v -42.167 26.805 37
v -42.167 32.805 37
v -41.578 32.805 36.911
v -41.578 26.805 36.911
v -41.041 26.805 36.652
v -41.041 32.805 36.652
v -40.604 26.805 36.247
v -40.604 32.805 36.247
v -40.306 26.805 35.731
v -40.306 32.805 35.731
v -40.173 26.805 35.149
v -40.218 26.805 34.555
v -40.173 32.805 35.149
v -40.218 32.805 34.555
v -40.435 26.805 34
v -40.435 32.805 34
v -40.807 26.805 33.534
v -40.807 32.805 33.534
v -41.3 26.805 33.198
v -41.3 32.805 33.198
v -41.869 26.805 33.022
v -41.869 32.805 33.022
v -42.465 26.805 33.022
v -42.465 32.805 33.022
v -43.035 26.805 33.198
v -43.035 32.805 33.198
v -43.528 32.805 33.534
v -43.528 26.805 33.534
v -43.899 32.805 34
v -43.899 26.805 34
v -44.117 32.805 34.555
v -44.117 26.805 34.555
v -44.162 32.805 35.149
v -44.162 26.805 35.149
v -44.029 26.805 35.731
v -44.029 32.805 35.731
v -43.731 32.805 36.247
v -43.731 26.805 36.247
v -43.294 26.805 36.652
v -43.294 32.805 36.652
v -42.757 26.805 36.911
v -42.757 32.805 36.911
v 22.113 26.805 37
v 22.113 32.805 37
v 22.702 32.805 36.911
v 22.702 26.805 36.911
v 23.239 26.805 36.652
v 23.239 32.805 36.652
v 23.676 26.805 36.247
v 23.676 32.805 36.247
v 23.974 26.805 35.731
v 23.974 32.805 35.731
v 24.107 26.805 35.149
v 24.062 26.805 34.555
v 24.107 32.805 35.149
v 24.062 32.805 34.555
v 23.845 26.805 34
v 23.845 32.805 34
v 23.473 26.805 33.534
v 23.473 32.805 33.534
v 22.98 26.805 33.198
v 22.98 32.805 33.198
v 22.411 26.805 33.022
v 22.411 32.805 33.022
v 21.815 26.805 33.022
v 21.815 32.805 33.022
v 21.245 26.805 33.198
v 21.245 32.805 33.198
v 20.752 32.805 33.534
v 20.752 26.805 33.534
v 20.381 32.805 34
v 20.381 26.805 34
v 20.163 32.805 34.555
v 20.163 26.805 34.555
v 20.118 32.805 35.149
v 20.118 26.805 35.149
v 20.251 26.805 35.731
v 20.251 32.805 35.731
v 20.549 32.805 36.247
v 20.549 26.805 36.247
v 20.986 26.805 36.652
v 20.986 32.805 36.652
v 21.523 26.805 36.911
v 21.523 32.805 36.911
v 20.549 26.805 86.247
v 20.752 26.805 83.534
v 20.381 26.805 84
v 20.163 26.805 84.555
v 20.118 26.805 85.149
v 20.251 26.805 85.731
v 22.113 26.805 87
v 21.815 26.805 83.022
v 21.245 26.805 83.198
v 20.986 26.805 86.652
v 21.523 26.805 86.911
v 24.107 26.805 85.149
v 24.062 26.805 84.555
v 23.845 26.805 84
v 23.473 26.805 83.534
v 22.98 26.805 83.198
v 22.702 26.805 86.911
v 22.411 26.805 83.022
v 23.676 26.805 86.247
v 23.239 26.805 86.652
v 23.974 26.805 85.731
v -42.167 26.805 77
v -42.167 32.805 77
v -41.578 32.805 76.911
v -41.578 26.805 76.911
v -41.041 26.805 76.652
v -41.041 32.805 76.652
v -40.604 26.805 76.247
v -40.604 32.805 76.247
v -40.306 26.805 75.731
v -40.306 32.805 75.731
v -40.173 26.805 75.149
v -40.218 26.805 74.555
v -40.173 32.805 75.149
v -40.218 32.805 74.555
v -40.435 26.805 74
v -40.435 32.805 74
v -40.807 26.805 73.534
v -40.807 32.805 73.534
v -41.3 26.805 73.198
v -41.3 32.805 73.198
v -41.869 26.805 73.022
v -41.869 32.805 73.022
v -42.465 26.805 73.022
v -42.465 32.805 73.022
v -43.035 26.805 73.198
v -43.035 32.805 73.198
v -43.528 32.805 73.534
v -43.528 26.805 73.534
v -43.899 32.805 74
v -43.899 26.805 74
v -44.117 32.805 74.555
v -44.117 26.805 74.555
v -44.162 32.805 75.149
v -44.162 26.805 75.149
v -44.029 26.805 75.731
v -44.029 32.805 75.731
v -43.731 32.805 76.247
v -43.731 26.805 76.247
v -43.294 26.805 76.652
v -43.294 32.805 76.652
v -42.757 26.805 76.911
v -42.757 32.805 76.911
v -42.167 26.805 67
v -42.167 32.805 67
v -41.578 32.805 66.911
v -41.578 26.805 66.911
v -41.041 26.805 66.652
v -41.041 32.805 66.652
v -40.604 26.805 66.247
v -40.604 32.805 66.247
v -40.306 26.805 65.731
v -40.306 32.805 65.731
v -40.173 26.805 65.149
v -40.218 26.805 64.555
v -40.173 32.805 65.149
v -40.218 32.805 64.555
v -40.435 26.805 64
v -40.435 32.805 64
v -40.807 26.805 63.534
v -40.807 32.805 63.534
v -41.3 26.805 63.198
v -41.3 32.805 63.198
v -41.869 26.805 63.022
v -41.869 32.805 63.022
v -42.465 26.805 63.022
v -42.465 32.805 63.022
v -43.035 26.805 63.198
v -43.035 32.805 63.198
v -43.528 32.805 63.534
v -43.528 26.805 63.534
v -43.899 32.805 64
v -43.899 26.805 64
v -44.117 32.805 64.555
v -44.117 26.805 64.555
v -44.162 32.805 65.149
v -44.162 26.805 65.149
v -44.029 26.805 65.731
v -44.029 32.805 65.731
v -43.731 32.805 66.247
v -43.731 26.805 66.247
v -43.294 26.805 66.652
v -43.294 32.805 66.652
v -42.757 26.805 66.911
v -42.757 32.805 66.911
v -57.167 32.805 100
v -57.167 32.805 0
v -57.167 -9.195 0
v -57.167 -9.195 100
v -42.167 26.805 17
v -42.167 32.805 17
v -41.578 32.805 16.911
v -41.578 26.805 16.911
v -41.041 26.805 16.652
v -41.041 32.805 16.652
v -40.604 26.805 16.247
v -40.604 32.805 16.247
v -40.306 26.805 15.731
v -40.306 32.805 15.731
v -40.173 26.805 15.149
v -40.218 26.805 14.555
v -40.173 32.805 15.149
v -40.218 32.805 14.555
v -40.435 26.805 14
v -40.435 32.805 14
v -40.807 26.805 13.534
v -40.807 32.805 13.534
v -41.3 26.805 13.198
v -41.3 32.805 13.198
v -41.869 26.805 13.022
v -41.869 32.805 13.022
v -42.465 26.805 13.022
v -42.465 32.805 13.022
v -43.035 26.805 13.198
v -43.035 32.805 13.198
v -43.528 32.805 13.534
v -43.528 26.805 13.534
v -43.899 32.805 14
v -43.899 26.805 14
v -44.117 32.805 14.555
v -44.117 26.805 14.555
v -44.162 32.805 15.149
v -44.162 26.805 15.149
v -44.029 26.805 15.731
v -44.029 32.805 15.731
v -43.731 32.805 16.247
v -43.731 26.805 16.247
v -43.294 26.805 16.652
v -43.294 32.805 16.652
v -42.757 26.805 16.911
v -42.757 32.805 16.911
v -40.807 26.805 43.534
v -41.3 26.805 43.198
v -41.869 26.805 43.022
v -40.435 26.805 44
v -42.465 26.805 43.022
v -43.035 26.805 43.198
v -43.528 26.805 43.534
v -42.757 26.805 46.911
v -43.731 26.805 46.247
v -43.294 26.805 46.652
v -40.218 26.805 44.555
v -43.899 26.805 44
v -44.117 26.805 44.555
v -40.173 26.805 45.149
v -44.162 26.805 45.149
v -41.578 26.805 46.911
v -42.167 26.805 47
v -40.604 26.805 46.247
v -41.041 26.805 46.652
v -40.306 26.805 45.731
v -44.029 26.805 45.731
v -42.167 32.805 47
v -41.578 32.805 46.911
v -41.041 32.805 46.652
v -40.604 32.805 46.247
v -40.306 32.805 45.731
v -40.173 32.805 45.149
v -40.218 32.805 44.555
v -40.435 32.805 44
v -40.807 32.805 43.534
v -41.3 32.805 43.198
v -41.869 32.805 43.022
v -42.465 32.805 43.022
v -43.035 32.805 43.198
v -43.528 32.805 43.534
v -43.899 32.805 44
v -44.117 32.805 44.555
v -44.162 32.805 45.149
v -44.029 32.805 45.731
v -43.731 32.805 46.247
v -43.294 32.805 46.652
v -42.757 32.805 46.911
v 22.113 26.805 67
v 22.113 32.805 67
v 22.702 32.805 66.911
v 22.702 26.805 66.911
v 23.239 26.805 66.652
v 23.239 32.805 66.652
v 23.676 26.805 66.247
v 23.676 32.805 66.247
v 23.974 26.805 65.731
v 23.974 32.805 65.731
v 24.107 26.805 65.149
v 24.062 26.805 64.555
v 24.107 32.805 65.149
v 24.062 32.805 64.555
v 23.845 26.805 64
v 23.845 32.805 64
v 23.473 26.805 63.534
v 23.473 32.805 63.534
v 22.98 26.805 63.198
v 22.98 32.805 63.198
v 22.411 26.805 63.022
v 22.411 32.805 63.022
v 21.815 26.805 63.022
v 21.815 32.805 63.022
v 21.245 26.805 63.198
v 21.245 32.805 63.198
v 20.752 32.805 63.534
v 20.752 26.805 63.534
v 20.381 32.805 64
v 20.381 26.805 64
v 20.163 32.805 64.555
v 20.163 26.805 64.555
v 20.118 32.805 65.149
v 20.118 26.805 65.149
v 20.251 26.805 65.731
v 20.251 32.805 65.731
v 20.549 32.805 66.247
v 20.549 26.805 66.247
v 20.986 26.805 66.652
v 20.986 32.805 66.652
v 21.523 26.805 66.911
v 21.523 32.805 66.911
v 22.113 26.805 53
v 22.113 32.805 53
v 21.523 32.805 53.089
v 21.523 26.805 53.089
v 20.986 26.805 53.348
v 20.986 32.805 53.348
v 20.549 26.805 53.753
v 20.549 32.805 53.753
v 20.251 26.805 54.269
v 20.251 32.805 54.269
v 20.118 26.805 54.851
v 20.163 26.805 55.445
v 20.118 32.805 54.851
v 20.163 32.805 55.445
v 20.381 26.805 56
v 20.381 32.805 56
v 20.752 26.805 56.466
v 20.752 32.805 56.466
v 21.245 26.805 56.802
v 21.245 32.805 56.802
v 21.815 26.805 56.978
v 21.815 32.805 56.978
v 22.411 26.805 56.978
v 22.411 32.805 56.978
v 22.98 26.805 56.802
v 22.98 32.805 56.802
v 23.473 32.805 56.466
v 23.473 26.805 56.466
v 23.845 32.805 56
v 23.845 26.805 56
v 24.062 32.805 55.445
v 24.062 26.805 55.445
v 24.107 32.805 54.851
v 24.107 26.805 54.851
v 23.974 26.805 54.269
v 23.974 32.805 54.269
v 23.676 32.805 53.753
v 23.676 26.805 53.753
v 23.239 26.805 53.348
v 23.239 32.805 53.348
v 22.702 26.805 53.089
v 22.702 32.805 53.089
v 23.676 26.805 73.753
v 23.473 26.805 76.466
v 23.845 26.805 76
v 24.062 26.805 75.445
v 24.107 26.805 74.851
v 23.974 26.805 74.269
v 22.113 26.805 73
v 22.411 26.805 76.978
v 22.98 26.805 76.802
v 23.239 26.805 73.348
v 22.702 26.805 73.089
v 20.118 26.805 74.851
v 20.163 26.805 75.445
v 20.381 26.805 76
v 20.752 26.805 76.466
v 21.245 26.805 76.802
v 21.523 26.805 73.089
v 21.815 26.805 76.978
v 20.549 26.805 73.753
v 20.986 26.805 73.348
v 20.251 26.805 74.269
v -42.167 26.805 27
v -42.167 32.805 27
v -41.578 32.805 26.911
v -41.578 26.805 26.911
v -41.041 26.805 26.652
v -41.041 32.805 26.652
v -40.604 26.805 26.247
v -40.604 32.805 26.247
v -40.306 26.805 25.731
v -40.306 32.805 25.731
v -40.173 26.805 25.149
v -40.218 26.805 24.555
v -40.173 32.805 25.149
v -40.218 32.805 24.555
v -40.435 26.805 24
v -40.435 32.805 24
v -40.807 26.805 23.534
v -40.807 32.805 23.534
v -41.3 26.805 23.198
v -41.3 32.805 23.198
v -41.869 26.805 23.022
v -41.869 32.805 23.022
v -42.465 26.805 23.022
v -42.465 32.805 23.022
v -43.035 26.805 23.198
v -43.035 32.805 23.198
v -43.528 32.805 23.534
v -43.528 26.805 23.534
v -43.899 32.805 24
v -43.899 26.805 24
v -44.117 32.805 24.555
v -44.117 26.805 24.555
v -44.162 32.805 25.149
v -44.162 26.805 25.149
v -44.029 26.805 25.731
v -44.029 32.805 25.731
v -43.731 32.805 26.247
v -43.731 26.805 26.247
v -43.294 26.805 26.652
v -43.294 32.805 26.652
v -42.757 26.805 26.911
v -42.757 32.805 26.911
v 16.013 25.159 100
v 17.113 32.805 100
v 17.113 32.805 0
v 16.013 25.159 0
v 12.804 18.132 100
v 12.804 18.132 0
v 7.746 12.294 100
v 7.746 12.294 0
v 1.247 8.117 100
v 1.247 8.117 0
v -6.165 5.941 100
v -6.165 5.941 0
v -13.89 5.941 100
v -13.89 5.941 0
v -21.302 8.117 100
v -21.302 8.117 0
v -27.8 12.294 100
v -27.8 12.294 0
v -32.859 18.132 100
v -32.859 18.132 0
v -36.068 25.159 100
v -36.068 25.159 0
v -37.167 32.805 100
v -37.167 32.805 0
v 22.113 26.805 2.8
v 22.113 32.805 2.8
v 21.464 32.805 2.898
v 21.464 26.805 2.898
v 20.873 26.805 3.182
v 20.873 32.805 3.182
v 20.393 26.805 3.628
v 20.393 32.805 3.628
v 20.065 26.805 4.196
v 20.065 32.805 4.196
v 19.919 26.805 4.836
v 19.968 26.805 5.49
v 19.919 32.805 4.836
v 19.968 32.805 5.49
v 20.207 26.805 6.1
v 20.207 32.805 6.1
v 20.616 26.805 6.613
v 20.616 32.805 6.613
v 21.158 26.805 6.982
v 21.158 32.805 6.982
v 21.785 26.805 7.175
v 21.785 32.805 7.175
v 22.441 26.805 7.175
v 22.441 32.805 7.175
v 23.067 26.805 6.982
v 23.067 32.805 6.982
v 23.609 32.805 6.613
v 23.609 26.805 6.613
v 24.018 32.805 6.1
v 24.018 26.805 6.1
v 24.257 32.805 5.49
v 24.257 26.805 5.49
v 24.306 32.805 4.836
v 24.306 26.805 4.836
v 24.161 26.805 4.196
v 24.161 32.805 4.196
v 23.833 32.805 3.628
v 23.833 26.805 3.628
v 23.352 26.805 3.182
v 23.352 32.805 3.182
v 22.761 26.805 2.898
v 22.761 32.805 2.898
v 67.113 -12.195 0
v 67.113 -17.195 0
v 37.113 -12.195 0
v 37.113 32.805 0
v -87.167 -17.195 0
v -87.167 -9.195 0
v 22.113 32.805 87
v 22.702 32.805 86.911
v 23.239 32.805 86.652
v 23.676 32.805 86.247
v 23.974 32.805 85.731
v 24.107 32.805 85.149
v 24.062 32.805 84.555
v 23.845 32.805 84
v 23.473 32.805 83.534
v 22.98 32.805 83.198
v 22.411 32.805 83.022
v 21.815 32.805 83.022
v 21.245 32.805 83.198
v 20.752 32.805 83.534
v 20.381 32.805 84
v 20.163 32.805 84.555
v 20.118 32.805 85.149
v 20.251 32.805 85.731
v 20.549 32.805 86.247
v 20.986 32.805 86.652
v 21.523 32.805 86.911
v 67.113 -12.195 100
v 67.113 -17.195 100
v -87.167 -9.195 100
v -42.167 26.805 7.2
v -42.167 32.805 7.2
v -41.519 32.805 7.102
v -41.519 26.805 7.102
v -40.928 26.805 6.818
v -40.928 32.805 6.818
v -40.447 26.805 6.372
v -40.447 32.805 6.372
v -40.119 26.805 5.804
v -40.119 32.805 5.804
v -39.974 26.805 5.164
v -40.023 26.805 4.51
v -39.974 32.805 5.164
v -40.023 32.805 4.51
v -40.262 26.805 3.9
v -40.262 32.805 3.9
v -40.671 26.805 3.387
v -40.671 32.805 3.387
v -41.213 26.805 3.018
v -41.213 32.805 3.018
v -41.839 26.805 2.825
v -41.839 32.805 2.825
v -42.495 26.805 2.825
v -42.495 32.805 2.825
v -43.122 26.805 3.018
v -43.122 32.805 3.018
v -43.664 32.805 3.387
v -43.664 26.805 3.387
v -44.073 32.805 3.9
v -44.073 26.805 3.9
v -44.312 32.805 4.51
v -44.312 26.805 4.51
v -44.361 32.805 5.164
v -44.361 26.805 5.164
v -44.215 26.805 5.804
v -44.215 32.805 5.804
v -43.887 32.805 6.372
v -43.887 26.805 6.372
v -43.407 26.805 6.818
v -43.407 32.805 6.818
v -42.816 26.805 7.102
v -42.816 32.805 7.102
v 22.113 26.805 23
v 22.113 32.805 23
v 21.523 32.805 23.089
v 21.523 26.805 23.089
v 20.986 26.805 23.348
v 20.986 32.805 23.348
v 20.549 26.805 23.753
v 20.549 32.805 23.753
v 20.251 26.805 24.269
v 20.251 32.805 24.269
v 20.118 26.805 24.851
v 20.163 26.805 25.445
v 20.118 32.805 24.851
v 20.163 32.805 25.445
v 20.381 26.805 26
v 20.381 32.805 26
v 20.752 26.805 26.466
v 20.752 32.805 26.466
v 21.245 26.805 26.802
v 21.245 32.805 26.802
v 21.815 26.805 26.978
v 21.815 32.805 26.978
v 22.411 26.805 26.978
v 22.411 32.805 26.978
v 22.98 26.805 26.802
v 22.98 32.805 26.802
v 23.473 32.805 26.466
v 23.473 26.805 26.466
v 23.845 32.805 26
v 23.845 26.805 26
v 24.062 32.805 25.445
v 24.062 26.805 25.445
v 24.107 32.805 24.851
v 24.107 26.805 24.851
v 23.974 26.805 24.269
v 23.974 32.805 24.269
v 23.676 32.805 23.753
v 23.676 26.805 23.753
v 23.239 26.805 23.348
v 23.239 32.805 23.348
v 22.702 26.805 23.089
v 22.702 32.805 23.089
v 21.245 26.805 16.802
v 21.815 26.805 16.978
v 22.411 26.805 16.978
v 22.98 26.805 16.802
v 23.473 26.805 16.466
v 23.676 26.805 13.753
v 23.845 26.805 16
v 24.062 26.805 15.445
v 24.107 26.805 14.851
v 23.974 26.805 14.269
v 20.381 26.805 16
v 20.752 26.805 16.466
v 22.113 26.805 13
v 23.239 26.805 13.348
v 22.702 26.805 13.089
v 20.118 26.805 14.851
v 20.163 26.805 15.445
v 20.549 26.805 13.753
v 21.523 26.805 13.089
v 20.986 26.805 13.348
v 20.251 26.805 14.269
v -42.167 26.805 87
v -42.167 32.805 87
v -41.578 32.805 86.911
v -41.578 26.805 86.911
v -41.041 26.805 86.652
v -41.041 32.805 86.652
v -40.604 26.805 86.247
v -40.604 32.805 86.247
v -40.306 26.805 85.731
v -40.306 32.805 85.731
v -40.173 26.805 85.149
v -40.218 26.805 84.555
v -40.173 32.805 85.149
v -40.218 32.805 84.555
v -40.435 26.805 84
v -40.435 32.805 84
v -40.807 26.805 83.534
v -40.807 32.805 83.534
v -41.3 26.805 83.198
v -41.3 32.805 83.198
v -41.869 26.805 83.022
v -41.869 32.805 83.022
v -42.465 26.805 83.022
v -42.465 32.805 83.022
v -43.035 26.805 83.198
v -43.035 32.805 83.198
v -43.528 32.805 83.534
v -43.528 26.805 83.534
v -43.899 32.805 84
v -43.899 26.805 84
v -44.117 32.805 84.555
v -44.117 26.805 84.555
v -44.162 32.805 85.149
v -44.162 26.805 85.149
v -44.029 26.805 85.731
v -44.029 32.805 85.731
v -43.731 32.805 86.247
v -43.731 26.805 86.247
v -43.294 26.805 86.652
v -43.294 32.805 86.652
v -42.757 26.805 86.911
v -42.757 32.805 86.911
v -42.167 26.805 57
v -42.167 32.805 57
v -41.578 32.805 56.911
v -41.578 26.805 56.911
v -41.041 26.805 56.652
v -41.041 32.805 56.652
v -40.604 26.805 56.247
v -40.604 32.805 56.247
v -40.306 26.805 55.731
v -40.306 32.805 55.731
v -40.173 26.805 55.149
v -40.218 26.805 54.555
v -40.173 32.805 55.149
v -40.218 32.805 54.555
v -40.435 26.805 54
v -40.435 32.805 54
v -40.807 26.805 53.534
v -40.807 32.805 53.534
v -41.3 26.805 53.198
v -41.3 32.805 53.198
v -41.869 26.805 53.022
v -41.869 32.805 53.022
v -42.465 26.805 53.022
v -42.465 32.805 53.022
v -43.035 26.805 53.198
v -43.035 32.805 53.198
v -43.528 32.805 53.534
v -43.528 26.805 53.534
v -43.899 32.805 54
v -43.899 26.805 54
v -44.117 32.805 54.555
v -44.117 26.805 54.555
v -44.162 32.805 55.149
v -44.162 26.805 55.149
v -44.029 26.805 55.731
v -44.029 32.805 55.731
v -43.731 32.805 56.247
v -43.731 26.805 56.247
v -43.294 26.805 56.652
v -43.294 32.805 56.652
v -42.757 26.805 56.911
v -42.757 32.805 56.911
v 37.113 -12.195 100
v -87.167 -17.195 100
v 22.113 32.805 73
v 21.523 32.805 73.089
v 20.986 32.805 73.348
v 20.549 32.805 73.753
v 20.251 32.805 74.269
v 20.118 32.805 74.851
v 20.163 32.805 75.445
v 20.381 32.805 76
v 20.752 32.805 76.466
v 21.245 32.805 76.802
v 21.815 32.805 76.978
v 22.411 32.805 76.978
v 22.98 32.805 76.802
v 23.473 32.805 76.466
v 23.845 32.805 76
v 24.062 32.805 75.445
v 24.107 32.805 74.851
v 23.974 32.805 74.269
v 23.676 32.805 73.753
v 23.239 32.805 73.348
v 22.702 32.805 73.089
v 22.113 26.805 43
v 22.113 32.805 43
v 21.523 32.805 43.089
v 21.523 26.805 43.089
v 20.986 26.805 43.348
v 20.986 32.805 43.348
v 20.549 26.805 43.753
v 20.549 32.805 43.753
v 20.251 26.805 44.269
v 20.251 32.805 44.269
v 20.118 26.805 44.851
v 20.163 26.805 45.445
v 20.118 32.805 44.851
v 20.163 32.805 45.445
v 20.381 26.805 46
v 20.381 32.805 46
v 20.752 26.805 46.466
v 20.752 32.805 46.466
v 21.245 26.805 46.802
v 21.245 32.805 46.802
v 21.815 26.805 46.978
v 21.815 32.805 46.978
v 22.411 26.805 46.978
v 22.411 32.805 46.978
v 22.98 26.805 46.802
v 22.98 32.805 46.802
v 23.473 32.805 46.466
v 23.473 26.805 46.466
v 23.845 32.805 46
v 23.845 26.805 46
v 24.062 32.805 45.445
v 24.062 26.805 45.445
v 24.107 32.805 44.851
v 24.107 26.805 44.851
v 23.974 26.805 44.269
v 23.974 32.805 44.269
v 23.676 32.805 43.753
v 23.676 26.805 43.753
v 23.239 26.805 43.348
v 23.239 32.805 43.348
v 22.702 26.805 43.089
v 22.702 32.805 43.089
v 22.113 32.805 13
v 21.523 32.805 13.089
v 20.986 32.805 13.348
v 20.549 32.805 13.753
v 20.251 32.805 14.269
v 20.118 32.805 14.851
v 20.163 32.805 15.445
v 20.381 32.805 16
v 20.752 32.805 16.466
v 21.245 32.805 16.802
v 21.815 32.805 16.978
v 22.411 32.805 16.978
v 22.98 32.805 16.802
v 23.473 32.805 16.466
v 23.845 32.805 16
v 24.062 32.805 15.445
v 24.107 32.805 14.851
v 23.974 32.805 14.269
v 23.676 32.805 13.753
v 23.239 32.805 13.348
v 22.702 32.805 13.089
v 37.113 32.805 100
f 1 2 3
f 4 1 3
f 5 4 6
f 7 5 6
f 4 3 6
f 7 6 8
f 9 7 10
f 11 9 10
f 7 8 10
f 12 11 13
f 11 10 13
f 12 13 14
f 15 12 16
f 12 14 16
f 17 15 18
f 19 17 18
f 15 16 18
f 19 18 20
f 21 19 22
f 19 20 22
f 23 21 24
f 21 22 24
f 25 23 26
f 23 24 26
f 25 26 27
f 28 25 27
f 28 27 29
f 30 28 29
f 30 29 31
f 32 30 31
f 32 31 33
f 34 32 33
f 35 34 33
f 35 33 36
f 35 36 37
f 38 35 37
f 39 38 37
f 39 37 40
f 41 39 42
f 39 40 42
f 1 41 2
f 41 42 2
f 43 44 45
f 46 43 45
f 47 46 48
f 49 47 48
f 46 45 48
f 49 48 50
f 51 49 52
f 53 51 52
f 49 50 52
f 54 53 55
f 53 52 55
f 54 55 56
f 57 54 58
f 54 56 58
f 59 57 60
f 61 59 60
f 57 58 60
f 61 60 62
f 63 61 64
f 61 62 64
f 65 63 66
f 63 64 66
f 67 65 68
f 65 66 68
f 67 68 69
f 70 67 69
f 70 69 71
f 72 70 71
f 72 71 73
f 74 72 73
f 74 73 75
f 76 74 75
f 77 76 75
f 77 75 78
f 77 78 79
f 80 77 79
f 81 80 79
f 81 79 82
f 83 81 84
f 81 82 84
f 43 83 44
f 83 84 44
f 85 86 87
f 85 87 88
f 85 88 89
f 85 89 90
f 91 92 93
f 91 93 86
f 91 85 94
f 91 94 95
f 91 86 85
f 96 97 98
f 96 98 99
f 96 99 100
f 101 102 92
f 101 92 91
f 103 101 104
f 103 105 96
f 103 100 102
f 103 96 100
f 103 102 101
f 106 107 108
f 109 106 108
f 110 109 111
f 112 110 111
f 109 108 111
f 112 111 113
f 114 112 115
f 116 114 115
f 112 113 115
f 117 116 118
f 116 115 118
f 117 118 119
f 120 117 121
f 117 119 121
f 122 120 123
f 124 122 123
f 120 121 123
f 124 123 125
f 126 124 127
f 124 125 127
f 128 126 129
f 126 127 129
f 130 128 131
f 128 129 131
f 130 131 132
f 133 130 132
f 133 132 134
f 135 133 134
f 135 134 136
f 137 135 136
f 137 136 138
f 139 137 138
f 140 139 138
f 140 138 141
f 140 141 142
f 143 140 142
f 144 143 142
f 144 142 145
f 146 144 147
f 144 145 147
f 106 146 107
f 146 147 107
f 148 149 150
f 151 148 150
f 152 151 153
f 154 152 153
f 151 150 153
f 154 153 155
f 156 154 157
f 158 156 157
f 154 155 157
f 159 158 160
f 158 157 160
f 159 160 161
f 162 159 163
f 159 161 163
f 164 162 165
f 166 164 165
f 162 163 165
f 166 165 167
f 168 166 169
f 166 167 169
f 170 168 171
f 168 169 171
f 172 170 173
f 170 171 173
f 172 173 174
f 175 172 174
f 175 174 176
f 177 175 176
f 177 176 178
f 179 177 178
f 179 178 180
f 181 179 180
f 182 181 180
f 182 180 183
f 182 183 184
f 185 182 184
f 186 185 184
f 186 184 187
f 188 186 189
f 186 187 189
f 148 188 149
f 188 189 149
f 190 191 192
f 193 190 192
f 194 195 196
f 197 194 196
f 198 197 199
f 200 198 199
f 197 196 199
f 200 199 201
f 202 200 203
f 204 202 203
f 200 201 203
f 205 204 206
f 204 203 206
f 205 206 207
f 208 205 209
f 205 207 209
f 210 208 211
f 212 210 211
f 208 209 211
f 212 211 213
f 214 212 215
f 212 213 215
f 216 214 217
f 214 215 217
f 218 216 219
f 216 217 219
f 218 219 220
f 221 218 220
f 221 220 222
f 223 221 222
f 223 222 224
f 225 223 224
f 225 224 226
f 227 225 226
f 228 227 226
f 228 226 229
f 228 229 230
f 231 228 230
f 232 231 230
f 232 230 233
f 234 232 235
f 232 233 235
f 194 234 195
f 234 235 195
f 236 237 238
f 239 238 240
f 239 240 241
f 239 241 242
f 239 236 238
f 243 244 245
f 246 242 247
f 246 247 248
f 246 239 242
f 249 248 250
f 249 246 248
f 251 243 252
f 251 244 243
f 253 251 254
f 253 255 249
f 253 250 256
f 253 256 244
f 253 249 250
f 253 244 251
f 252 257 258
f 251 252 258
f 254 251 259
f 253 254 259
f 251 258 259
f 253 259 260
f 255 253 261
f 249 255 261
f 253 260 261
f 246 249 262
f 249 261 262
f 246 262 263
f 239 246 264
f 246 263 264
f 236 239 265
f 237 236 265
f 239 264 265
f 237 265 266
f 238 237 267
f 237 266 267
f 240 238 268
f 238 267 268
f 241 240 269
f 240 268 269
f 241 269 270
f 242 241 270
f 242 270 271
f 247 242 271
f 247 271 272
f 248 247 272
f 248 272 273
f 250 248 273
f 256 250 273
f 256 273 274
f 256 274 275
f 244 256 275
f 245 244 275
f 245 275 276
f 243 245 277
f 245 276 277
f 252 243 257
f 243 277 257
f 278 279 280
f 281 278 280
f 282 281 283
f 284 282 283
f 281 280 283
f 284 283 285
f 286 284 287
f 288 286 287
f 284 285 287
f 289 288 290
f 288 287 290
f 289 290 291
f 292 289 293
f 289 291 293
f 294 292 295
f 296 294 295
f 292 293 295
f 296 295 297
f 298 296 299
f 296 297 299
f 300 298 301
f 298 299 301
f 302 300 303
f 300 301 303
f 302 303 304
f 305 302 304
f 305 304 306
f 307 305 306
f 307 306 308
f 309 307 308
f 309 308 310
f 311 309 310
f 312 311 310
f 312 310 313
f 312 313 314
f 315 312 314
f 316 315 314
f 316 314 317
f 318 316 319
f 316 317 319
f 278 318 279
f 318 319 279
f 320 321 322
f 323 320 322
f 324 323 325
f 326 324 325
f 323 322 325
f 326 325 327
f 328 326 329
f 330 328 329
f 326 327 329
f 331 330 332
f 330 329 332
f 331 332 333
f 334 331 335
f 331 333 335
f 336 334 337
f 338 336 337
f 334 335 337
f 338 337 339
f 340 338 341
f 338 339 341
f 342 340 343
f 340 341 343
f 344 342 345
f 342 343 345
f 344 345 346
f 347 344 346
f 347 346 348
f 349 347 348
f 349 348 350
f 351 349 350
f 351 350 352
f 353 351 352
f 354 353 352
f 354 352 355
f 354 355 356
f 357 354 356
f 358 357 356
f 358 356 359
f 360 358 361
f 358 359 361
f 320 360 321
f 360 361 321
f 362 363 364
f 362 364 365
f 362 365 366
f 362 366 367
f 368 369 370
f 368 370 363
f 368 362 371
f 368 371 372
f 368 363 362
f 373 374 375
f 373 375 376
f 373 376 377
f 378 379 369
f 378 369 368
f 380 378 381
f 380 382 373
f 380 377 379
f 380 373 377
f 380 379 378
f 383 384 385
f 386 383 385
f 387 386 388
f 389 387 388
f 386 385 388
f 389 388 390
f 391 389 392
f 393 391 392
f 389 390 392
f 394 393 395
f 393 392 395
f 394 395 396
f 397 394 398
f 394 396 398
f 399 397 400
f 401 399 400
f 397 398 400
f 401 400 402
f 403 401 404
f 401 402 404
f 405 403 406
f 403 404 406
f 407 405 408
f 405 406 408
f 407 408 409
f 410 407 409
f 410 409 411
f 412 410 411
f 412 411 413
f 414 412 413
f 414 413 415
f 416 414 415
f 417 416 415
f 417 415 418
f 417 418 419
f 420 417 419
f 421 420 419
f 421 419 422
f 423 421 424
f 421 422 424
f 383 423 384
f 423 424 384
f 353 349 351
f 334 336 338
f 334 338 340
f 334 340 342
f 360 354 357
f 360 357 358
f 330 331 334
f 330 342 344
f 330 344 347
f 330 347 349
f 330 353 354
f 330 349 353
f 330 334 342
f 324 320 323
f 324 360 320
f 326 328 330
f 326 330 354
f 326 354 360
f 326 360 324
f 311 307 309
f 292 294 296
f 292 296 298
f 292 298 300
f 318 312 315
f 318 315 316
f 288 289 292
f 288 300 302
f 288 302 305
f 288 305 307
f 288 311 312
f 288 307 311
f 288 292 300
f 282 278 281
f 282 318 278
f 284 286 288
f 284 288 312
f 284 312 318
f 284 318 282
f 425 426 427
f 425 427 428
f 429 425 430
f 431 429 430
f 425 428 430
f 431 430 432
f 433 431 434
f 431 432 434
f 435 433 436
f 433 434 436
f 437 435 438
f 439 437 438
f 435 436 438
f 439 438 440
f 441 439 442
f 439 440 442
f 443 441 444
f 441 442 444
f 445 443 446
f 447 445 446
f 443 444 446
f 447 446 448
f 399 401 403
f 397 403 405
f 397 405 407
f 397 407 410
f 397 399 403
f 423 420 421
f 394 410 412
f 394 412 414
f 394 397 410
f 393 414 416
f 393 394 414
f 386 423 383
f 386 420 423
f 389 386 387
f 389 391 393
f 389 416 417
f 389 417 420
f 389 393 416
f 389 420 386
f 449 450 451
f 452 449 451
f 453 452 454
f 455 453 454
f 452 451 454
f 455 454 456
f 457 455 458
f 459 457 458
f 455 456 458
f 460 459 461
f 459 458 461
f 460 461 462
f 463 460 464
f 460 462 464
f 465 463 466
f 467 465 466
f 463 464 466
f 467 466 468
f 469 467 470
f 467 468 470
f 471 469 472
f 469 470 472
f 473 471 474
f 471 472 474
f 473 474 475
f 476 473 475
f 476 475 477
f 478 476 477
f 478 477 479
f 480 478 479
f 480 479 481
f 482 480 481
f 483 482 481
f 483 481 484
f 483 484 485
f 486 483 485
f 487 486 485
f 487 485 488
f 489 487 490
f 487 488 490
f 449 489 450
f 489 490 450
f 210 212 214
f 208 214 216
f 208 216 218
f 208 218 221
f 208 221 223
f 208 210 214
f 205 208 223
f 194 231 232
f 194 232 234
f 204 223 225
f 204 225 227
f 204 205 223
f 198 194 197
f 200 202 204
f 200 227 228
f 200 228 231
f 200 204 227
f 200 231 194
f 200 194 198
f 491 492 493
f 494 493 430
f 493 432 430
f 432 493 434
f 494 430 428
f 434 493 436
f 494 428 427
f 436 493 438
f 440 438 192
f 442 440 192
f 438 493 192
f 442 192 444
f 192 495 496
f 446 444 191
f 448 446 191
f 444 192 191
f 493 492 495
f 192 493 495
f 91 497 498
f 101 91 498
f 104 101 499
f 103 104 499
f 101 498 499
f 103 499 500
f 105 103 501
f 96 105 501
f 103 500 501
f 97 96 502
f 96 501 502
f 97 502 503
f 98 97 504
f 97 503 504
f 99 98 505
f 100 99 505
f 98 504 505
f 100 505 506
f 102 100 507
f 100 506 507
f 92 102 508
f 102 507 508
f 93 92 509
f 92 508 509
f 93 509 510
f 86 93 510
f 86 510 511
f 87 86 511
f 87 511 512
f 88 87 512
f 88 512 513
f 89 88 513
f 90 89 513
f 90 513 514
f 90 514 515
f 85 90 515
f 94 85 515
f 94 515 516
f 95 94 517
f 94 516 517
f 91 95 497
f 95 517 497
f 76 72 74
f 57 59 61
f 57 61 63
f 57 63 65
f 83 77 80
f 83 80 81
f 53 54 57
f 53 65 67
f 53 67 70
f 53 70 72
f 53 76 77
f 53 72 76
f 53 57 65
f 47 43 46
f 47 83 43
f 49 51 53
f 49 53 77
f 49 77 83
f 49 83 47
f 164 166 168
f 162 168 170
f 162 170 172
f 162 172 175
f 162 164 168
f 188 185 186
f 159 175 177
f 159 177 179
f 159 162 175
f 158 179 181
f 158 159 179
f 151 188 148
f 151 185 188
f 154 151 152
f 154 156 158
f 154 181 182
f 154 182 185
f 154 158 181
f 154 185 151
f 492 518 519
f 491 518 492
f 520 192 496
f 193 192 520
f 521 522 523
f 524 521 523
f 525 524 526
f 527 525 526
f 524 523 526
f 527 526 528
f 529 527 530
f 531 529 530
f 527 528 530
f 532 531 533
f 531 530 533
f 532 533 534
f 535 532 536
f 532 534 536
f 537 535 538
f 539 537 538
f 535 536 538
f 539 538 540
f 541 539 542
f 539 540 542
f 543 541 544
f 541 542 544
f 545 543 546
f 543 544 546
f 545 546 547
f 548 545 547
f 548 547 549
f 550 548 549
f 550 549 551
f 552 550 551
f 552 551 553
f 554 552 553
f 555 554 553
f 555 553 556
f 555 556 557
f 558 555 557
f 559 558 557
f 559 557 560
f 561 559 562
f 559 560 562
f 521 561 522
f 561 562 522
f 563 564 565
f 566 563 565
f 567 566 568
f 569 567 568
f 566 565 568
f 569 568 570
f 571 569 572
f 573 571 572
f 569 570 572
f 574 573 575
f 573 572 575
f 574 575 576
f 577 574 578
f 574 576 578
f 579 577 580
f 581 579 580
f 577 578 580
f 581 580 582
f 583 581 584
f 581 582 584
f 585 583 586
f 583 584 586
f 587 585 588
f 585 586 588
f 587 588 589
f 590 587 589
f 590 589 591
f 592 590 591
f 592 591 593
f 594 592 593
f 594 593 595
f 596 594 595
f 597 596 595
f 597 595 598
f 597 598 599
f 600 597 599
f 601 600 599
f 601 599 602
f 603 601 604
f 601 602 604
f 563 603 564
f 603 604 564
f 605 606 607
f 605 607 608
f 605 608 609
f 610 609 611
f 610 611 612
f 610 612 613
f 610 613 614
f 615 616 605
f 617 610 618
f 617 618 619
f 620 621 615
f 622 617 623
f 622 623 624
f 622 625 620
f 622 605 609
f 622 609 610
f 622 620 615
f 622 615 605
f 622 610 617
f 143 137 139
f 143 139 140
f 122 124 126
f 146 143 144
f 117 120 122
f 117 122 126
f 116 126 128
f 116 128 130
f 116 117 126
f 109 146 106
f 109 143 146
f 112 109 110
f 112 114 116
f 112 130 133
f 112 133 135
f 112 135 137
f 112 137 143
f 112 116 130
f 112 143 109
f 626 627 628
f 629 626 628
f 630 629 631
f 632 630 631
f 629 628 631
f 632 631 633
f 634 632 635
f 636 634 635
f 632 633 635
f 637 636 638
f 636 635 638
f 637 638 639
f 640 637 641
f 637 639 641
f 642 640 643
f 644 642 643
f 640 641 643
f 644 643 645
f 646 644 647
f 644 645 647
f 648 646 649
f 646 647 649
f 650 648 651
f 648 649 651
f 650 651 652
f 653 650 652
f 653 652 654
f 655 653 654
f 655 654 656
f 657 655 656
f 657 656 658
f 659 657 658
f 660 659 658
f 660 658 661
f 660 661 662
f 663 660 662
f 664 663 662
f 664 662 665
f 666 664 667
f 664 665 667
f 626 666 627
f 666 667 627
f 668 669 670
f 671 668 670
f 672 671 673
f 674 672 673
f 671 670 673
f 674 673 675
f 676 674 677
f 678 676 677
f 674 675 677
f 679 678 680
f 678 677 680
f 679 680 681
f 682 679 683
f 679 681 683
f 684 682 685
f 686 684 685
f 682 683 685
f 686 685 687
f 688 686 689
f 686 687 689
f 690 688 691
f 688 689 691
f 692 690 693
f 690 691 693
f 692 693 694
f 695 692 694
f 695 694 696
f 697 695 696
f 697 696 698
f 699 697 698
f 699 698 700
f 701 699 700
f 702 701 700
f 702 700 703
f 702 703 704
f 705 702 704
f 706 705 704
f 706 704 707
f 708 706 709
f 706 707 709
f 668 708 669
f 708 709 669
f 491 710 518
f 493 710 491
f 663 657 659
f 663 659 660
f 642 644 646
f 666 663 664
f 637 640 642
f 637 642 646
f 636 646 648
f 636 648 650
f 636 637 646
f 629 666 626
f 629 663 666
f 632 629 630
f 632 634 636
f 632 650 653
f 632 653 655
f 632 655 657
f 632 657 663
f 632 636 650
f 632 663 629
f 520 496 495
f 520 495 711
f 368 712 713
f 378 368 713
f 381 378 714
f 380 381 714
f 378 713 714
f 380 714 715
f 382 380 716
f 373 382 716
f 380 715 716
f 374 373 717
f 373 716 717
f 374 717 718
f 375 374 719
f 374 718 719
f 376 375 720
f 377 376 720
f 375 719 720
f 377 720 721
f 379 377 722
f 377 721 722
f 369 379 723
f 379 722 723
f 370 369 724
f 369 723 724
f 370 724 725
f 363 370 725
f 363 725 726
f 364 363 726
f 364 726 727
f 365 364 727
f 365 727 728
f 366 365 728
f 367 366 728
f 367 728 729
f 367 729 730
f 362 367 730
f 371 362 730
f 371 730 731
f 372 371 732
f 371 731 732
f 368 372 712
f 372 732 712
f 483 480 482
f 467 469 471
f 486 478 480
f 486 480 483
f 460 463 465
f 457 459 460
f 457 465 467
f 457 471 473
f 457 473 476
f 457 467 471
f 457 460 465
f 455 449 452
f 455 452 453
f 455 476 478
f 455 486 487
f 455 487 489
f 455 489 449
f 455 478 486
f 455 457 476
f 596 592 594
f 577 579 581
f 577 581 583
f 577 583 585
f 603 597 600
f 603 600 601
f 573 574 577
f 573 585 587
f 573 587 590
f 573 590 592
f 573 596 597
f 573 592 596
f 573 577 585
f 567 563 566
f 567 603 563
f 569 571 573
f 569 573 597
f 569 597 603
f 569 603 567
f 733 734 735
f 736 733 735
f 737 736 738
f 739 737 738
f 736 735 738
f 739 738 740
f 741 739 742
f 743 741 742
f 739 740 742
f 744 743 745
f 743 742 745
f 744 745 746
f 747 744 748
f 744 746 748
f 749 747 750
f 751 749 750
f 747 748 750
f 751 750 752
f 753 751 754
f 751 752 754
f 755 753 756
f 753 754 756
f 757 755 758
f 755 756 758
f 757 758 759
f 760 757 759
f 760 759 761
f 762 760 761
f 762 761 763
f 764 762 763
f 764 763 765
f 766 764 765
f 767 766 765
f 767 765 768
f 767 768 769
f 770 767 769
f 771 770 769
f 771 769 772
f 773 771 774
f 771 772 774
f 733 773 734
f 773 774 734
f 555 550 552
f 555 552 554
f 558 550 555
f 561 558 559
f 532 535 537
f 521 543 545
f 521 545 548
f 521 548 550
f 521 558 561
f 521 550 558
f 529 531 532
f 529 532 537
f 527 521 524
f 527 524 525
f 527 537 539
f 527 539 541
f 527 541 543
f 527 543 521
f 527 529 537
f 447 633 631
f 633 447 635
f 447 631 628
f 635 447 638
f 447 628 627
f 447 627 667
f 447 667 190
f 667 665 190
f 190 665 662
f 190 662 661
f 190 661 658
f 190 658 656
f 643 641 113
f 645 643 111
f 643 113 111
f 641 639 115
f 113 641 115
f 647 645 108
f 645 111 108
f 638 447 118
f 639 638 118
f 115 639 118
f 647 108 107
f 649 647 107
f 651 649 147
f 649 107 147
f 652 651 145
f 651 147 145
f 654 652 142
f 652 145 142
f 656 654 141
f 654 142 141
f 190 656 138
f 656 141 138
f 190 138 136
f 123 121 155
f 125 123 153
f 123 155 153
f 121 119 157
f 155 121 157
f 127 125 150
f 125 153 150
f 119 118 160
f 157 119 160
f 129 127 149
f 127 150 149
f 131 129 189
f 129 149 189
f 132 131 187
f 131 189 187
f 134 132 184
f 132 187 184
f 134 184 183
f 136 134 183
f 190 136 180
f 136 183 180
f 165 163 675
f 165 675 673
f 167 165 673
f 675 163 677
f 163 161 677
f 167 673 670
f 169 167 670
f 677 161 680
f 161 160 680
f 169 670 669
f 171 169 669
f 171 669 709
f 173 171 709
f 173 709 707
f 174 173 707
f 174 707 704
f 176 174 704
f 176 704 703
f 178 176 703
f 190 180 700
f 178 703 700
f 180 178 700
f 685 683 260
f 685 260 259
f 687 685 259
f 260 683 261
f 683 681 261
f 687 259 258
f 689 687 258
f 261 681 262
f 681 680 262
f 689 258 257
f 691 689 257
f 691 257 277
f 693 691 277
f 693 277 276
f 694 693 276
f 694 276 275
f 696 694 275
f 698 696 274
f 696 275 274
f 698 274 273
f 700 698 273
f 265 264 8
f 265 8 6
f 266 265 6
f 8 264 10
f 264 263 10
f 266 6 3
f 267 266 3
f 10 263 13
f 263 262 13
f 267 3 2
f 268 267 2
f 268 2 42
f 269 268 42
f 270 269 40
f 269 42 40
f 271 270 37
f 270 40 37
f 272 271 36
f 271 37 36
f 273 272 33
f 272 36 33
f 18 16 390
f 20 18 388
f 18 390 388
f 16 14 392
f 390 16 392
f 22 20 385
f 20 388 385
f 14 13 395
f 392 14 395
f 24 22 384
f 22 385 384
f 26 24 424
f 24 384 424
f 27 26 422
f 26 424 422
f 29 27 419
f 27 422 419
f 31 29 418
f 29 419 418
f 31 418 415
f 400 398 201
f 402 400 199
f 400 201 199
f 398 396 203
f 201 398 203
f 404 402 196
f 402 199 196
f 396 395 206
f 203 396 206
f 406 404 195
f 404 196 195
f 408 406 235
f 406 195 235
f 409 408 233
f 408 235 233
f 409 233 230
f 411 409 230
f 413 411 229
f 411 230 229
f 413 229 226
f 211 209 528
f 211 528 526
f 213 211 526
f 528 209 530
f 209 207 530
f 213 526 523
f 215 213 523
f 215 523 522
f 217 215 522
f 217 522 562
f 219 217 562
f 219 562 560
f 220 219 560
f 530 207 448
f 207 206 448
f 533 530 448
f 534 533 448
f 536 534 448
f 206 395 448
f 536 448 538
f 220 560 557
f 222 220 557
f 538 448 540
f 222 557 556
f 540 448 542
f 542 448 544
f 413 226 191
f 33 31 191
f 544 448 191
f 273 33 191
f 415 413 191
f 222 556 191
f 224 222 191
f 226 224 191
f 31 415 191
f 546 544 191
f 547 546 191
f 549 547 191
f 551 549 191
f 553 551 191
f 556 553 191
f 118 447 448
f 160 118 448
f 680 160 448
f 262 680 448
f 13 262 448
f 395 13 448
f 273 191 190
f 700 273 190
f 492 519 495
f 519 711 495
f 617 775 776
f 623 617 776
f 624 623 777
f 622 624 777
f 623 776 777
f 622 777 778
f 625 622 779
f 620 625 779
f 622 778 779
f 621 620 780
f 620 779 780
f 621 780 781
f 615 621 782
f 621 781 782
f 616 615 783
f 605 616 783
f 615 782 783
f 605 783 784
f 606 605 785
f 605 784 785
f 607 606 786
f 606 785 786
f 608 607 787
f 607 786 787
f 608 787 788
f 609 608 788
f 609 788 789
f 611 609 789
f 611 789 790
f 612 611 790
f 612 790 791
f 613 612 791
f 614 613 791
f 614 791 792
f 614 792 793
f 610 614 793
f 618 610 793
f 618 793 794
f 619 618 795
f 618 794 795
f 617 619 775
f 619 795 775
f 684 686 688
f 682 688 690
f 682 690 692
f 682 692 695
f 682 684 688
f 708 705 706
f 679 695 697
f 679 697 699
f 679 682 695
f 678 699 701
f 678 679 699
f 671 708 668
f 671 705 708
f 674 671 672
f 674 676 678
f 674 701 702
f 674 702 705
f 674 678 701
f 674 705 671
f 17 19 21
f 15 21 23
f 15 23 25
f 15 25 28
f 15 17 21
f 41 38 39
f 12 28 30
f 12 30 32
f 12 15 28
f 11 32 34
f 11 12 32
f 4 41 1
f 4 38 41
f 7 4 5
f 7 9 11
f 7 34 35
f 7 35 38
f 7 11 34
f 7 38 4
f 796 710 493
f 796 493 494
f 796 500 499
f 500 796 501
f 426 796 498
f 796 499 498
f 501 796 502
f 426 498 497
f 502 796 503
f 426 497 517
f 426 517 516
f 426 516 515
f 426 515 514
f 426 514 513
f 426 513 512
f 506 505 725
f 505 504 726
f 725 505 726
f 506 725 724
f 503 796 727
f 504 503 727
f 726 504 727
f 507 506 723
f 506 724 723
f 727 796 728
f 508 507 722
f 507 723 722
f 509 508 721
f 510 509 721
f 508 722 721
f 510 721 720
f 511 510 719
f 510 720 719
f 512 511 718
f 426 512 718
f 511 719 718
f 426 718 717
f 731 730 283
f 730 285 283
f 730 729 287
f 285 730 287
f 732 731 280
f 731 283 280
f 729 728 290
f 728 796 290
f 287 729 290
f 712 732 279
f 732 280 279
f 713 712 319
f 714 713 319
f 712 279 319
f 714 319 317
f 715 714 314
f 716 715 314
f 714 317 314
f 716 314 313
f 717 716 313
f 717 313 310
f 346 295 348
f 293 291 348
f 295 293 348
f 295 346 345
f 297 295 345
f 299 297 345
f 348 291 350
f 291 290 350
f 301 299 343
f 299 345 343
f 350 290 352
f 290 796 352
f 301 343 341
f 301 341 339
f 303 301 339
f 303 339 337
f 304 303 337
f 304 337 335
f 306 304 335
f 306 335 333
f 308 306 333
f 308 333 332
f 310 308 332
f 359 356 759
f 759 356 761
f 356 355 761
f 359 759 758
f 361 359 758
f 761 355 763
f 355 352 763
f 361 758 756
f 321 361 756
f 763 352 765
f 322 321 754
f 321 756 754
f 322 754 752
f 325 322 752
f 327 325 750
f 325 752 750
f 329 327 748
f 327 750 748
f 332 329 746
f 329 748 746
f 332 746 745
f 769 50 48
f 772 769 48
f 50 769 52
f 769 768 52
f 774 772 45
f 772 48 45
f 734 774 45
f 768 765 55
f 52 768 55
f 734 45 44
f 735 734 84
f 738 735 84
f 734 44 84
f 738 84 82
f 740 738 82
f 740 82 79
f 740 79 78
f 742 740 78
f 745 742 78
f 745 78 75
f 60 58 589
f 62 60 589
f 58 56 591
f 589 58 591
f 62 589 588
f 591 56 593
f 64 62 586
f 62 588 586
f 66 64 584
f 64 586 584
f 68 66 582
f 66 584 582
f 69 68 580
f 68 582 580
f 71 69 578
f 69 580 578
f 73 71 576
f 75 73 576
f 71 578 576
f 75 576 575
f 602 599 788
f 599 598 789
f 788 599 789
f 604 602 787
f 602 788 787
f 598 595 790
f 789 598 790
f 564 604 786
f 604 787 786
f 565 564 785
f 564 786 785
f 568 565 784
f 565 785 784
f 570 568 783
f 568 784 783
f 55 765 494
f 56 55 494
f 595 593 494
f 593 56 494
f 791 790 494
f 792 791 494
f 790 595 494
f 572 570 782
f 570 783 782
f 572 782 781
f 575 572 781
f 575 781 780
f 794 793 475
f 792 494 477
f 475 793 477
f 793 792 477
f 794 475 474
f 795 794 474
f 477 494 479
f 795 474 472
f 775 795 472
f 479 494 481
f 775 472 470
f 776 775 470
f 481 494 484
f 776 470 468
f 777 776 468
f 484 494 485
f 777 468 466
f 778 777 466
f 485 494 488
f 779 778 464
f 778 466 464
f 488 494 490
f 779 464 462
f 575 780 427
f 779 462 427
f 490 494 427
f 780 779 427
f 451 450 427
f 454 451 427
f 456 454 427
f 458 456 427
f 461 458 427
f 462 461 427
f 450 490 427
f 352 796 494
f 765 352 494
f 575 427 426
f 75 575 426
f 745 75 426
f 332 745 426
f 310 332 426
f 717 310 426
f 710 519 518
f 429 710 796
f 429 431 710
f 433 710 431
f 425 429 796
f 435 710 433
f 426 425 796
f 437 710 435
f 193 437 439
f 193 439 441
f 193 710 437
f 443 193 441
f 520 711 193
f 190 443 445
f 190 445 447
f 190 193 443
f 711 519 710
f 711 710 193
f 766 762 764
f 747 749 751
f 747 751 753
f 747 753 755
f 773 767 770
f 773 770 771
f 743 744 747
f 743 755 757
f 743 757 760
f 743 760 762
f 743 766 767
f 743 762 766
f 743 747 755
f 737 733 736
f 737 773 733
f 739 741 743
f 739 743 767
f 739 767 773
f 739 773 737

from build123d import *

# Parameters (mm, degrees)
BOSS_EXTRUDE1_DEPTH = 100
SKETCH2_R           = 2.2
SKETCH2_R_2         = 2
CUT_EXTRUDE2_DEPTH  = 6
SKETCH3_W           = 100
SKETCH3_H           = 8
BOSS_EXTRUDE2_DEPTH = 30
SKETCH4_W           = 100
SKETCH4_H           = 5
BOSS_EXTRUDE3_DEPTH = 30


with BuildPart() as part:
    # Sketch1 → Boss-Extrude1 (new body)
    with BuildSketch(Plane.XY):
        with BuildLine():
            Line((-57.167378994, 32.80487151), (-57.167378994, -17.19512849))
            Line((-57.167378994, -17.19512849), (37.112621006, -17.19512849))
            Line((37.112621006, -17.19512849), (37.112621006, 32.80487151))
            Line((37.112621006, 32.80487151), (17.112621006, 32.80487151))
            ThreePointArc((17.112621006, 32.80487151), (-10.027378994, 5.66487151), (-37.167378994, 32.80487151))
            Line((-37.167378994, 32.80487151), (-57.167378994, 32.80487151))
        make_face()
    extrude(amount=BOSS_EXTRUDE1_DEPTH)

    # Sketch2 → Cut-Extrude2 (cut)
    with BuildSketch(Plane(origin=(0, 32.80487151, 0), x_dir=(1, 0, 0), z_dir=(0, 1, 0))):
        with Locations((-42.167378994, -5)):
            Circle(SKETCH2_R)
        with Locations((-42.167378994, -15)):
            Circle(SKETCH2_R_2)
        with Locations((-42.167378994, -25)):
            Circle(SKETCH2_R_2)
        with Locations((-42.167378994, -35)):
            Circle(SKETCH2_R_2)
        with Locations((-42.167378994, -45)):
            Circle(SKETCH2_R_2)
        with Locations((-42.167378994, -55)):
            Circle(SKETCH2_R_2)
        with Locations((-42.167378994, -65)):
            Circle(SKETCH2_R_2)
        with Locations((-42.167378994, -75)):
            Circle(SKETCH2_R_2)
        with Locations((-42.167378994, -85)):
            Circle(SKETCH2_R_2)
        with Locations((22.112621006, -85)):
            Circle(SKETCH2_R_2)
        with Locations((22.112621006, -75)):
            Circle(SKETCH2_R_2)
        with Locations((22.112621006, -65)):
            Circle(SKETCH2_R_2)
        with Locations((22.112621006, -55)):
            Circle(SKETCH2_R_2)
        with Locations((22.112621006, -45)):
            Circle(SKETCH2_R_2)
        with Locations((22.112621006, -35)):
            Circle(SKETCH2_R_2)
        with Locations((22.112621006, -25)):
            Circle(SKETCH2_R_2)
        with Locations((22.112621006, -15)):
            Circle(SKETCH2_R_2)
        with Locations((22.112621006, -5)):
            Circle(SKETCH2_R)
    extrude(amount=-CUT_EXTRUDE2_DEPTH, mode=Mode.SUBTRACT)

    # Sketch3 → Boss-Extrude2 (add)
    with BuildSketch(Plane.ZY.offset(57.167378994)):
        with Locations((50, -13.19512849)):
            Rectangle(SKETCH3_W, SKETCH3_H)
    extrude(amount=BOSS_EXTRUDE2_DEPTH)

    # Sketch4 → Boss-Extrude3 (add)
    with BuildSketch(Plane(origin=(37.112621006, 0, 0), x_dir=(0, 0, -1), z_dir=(1, 0, 0))):
        with Locations((-50, -14.69512849)):
            Rectangle(SKETCH4_W, SKETCH4_H)
    extrude(amount=BOSS_EXTRUDE3_DEPTH)


solid = part.part
